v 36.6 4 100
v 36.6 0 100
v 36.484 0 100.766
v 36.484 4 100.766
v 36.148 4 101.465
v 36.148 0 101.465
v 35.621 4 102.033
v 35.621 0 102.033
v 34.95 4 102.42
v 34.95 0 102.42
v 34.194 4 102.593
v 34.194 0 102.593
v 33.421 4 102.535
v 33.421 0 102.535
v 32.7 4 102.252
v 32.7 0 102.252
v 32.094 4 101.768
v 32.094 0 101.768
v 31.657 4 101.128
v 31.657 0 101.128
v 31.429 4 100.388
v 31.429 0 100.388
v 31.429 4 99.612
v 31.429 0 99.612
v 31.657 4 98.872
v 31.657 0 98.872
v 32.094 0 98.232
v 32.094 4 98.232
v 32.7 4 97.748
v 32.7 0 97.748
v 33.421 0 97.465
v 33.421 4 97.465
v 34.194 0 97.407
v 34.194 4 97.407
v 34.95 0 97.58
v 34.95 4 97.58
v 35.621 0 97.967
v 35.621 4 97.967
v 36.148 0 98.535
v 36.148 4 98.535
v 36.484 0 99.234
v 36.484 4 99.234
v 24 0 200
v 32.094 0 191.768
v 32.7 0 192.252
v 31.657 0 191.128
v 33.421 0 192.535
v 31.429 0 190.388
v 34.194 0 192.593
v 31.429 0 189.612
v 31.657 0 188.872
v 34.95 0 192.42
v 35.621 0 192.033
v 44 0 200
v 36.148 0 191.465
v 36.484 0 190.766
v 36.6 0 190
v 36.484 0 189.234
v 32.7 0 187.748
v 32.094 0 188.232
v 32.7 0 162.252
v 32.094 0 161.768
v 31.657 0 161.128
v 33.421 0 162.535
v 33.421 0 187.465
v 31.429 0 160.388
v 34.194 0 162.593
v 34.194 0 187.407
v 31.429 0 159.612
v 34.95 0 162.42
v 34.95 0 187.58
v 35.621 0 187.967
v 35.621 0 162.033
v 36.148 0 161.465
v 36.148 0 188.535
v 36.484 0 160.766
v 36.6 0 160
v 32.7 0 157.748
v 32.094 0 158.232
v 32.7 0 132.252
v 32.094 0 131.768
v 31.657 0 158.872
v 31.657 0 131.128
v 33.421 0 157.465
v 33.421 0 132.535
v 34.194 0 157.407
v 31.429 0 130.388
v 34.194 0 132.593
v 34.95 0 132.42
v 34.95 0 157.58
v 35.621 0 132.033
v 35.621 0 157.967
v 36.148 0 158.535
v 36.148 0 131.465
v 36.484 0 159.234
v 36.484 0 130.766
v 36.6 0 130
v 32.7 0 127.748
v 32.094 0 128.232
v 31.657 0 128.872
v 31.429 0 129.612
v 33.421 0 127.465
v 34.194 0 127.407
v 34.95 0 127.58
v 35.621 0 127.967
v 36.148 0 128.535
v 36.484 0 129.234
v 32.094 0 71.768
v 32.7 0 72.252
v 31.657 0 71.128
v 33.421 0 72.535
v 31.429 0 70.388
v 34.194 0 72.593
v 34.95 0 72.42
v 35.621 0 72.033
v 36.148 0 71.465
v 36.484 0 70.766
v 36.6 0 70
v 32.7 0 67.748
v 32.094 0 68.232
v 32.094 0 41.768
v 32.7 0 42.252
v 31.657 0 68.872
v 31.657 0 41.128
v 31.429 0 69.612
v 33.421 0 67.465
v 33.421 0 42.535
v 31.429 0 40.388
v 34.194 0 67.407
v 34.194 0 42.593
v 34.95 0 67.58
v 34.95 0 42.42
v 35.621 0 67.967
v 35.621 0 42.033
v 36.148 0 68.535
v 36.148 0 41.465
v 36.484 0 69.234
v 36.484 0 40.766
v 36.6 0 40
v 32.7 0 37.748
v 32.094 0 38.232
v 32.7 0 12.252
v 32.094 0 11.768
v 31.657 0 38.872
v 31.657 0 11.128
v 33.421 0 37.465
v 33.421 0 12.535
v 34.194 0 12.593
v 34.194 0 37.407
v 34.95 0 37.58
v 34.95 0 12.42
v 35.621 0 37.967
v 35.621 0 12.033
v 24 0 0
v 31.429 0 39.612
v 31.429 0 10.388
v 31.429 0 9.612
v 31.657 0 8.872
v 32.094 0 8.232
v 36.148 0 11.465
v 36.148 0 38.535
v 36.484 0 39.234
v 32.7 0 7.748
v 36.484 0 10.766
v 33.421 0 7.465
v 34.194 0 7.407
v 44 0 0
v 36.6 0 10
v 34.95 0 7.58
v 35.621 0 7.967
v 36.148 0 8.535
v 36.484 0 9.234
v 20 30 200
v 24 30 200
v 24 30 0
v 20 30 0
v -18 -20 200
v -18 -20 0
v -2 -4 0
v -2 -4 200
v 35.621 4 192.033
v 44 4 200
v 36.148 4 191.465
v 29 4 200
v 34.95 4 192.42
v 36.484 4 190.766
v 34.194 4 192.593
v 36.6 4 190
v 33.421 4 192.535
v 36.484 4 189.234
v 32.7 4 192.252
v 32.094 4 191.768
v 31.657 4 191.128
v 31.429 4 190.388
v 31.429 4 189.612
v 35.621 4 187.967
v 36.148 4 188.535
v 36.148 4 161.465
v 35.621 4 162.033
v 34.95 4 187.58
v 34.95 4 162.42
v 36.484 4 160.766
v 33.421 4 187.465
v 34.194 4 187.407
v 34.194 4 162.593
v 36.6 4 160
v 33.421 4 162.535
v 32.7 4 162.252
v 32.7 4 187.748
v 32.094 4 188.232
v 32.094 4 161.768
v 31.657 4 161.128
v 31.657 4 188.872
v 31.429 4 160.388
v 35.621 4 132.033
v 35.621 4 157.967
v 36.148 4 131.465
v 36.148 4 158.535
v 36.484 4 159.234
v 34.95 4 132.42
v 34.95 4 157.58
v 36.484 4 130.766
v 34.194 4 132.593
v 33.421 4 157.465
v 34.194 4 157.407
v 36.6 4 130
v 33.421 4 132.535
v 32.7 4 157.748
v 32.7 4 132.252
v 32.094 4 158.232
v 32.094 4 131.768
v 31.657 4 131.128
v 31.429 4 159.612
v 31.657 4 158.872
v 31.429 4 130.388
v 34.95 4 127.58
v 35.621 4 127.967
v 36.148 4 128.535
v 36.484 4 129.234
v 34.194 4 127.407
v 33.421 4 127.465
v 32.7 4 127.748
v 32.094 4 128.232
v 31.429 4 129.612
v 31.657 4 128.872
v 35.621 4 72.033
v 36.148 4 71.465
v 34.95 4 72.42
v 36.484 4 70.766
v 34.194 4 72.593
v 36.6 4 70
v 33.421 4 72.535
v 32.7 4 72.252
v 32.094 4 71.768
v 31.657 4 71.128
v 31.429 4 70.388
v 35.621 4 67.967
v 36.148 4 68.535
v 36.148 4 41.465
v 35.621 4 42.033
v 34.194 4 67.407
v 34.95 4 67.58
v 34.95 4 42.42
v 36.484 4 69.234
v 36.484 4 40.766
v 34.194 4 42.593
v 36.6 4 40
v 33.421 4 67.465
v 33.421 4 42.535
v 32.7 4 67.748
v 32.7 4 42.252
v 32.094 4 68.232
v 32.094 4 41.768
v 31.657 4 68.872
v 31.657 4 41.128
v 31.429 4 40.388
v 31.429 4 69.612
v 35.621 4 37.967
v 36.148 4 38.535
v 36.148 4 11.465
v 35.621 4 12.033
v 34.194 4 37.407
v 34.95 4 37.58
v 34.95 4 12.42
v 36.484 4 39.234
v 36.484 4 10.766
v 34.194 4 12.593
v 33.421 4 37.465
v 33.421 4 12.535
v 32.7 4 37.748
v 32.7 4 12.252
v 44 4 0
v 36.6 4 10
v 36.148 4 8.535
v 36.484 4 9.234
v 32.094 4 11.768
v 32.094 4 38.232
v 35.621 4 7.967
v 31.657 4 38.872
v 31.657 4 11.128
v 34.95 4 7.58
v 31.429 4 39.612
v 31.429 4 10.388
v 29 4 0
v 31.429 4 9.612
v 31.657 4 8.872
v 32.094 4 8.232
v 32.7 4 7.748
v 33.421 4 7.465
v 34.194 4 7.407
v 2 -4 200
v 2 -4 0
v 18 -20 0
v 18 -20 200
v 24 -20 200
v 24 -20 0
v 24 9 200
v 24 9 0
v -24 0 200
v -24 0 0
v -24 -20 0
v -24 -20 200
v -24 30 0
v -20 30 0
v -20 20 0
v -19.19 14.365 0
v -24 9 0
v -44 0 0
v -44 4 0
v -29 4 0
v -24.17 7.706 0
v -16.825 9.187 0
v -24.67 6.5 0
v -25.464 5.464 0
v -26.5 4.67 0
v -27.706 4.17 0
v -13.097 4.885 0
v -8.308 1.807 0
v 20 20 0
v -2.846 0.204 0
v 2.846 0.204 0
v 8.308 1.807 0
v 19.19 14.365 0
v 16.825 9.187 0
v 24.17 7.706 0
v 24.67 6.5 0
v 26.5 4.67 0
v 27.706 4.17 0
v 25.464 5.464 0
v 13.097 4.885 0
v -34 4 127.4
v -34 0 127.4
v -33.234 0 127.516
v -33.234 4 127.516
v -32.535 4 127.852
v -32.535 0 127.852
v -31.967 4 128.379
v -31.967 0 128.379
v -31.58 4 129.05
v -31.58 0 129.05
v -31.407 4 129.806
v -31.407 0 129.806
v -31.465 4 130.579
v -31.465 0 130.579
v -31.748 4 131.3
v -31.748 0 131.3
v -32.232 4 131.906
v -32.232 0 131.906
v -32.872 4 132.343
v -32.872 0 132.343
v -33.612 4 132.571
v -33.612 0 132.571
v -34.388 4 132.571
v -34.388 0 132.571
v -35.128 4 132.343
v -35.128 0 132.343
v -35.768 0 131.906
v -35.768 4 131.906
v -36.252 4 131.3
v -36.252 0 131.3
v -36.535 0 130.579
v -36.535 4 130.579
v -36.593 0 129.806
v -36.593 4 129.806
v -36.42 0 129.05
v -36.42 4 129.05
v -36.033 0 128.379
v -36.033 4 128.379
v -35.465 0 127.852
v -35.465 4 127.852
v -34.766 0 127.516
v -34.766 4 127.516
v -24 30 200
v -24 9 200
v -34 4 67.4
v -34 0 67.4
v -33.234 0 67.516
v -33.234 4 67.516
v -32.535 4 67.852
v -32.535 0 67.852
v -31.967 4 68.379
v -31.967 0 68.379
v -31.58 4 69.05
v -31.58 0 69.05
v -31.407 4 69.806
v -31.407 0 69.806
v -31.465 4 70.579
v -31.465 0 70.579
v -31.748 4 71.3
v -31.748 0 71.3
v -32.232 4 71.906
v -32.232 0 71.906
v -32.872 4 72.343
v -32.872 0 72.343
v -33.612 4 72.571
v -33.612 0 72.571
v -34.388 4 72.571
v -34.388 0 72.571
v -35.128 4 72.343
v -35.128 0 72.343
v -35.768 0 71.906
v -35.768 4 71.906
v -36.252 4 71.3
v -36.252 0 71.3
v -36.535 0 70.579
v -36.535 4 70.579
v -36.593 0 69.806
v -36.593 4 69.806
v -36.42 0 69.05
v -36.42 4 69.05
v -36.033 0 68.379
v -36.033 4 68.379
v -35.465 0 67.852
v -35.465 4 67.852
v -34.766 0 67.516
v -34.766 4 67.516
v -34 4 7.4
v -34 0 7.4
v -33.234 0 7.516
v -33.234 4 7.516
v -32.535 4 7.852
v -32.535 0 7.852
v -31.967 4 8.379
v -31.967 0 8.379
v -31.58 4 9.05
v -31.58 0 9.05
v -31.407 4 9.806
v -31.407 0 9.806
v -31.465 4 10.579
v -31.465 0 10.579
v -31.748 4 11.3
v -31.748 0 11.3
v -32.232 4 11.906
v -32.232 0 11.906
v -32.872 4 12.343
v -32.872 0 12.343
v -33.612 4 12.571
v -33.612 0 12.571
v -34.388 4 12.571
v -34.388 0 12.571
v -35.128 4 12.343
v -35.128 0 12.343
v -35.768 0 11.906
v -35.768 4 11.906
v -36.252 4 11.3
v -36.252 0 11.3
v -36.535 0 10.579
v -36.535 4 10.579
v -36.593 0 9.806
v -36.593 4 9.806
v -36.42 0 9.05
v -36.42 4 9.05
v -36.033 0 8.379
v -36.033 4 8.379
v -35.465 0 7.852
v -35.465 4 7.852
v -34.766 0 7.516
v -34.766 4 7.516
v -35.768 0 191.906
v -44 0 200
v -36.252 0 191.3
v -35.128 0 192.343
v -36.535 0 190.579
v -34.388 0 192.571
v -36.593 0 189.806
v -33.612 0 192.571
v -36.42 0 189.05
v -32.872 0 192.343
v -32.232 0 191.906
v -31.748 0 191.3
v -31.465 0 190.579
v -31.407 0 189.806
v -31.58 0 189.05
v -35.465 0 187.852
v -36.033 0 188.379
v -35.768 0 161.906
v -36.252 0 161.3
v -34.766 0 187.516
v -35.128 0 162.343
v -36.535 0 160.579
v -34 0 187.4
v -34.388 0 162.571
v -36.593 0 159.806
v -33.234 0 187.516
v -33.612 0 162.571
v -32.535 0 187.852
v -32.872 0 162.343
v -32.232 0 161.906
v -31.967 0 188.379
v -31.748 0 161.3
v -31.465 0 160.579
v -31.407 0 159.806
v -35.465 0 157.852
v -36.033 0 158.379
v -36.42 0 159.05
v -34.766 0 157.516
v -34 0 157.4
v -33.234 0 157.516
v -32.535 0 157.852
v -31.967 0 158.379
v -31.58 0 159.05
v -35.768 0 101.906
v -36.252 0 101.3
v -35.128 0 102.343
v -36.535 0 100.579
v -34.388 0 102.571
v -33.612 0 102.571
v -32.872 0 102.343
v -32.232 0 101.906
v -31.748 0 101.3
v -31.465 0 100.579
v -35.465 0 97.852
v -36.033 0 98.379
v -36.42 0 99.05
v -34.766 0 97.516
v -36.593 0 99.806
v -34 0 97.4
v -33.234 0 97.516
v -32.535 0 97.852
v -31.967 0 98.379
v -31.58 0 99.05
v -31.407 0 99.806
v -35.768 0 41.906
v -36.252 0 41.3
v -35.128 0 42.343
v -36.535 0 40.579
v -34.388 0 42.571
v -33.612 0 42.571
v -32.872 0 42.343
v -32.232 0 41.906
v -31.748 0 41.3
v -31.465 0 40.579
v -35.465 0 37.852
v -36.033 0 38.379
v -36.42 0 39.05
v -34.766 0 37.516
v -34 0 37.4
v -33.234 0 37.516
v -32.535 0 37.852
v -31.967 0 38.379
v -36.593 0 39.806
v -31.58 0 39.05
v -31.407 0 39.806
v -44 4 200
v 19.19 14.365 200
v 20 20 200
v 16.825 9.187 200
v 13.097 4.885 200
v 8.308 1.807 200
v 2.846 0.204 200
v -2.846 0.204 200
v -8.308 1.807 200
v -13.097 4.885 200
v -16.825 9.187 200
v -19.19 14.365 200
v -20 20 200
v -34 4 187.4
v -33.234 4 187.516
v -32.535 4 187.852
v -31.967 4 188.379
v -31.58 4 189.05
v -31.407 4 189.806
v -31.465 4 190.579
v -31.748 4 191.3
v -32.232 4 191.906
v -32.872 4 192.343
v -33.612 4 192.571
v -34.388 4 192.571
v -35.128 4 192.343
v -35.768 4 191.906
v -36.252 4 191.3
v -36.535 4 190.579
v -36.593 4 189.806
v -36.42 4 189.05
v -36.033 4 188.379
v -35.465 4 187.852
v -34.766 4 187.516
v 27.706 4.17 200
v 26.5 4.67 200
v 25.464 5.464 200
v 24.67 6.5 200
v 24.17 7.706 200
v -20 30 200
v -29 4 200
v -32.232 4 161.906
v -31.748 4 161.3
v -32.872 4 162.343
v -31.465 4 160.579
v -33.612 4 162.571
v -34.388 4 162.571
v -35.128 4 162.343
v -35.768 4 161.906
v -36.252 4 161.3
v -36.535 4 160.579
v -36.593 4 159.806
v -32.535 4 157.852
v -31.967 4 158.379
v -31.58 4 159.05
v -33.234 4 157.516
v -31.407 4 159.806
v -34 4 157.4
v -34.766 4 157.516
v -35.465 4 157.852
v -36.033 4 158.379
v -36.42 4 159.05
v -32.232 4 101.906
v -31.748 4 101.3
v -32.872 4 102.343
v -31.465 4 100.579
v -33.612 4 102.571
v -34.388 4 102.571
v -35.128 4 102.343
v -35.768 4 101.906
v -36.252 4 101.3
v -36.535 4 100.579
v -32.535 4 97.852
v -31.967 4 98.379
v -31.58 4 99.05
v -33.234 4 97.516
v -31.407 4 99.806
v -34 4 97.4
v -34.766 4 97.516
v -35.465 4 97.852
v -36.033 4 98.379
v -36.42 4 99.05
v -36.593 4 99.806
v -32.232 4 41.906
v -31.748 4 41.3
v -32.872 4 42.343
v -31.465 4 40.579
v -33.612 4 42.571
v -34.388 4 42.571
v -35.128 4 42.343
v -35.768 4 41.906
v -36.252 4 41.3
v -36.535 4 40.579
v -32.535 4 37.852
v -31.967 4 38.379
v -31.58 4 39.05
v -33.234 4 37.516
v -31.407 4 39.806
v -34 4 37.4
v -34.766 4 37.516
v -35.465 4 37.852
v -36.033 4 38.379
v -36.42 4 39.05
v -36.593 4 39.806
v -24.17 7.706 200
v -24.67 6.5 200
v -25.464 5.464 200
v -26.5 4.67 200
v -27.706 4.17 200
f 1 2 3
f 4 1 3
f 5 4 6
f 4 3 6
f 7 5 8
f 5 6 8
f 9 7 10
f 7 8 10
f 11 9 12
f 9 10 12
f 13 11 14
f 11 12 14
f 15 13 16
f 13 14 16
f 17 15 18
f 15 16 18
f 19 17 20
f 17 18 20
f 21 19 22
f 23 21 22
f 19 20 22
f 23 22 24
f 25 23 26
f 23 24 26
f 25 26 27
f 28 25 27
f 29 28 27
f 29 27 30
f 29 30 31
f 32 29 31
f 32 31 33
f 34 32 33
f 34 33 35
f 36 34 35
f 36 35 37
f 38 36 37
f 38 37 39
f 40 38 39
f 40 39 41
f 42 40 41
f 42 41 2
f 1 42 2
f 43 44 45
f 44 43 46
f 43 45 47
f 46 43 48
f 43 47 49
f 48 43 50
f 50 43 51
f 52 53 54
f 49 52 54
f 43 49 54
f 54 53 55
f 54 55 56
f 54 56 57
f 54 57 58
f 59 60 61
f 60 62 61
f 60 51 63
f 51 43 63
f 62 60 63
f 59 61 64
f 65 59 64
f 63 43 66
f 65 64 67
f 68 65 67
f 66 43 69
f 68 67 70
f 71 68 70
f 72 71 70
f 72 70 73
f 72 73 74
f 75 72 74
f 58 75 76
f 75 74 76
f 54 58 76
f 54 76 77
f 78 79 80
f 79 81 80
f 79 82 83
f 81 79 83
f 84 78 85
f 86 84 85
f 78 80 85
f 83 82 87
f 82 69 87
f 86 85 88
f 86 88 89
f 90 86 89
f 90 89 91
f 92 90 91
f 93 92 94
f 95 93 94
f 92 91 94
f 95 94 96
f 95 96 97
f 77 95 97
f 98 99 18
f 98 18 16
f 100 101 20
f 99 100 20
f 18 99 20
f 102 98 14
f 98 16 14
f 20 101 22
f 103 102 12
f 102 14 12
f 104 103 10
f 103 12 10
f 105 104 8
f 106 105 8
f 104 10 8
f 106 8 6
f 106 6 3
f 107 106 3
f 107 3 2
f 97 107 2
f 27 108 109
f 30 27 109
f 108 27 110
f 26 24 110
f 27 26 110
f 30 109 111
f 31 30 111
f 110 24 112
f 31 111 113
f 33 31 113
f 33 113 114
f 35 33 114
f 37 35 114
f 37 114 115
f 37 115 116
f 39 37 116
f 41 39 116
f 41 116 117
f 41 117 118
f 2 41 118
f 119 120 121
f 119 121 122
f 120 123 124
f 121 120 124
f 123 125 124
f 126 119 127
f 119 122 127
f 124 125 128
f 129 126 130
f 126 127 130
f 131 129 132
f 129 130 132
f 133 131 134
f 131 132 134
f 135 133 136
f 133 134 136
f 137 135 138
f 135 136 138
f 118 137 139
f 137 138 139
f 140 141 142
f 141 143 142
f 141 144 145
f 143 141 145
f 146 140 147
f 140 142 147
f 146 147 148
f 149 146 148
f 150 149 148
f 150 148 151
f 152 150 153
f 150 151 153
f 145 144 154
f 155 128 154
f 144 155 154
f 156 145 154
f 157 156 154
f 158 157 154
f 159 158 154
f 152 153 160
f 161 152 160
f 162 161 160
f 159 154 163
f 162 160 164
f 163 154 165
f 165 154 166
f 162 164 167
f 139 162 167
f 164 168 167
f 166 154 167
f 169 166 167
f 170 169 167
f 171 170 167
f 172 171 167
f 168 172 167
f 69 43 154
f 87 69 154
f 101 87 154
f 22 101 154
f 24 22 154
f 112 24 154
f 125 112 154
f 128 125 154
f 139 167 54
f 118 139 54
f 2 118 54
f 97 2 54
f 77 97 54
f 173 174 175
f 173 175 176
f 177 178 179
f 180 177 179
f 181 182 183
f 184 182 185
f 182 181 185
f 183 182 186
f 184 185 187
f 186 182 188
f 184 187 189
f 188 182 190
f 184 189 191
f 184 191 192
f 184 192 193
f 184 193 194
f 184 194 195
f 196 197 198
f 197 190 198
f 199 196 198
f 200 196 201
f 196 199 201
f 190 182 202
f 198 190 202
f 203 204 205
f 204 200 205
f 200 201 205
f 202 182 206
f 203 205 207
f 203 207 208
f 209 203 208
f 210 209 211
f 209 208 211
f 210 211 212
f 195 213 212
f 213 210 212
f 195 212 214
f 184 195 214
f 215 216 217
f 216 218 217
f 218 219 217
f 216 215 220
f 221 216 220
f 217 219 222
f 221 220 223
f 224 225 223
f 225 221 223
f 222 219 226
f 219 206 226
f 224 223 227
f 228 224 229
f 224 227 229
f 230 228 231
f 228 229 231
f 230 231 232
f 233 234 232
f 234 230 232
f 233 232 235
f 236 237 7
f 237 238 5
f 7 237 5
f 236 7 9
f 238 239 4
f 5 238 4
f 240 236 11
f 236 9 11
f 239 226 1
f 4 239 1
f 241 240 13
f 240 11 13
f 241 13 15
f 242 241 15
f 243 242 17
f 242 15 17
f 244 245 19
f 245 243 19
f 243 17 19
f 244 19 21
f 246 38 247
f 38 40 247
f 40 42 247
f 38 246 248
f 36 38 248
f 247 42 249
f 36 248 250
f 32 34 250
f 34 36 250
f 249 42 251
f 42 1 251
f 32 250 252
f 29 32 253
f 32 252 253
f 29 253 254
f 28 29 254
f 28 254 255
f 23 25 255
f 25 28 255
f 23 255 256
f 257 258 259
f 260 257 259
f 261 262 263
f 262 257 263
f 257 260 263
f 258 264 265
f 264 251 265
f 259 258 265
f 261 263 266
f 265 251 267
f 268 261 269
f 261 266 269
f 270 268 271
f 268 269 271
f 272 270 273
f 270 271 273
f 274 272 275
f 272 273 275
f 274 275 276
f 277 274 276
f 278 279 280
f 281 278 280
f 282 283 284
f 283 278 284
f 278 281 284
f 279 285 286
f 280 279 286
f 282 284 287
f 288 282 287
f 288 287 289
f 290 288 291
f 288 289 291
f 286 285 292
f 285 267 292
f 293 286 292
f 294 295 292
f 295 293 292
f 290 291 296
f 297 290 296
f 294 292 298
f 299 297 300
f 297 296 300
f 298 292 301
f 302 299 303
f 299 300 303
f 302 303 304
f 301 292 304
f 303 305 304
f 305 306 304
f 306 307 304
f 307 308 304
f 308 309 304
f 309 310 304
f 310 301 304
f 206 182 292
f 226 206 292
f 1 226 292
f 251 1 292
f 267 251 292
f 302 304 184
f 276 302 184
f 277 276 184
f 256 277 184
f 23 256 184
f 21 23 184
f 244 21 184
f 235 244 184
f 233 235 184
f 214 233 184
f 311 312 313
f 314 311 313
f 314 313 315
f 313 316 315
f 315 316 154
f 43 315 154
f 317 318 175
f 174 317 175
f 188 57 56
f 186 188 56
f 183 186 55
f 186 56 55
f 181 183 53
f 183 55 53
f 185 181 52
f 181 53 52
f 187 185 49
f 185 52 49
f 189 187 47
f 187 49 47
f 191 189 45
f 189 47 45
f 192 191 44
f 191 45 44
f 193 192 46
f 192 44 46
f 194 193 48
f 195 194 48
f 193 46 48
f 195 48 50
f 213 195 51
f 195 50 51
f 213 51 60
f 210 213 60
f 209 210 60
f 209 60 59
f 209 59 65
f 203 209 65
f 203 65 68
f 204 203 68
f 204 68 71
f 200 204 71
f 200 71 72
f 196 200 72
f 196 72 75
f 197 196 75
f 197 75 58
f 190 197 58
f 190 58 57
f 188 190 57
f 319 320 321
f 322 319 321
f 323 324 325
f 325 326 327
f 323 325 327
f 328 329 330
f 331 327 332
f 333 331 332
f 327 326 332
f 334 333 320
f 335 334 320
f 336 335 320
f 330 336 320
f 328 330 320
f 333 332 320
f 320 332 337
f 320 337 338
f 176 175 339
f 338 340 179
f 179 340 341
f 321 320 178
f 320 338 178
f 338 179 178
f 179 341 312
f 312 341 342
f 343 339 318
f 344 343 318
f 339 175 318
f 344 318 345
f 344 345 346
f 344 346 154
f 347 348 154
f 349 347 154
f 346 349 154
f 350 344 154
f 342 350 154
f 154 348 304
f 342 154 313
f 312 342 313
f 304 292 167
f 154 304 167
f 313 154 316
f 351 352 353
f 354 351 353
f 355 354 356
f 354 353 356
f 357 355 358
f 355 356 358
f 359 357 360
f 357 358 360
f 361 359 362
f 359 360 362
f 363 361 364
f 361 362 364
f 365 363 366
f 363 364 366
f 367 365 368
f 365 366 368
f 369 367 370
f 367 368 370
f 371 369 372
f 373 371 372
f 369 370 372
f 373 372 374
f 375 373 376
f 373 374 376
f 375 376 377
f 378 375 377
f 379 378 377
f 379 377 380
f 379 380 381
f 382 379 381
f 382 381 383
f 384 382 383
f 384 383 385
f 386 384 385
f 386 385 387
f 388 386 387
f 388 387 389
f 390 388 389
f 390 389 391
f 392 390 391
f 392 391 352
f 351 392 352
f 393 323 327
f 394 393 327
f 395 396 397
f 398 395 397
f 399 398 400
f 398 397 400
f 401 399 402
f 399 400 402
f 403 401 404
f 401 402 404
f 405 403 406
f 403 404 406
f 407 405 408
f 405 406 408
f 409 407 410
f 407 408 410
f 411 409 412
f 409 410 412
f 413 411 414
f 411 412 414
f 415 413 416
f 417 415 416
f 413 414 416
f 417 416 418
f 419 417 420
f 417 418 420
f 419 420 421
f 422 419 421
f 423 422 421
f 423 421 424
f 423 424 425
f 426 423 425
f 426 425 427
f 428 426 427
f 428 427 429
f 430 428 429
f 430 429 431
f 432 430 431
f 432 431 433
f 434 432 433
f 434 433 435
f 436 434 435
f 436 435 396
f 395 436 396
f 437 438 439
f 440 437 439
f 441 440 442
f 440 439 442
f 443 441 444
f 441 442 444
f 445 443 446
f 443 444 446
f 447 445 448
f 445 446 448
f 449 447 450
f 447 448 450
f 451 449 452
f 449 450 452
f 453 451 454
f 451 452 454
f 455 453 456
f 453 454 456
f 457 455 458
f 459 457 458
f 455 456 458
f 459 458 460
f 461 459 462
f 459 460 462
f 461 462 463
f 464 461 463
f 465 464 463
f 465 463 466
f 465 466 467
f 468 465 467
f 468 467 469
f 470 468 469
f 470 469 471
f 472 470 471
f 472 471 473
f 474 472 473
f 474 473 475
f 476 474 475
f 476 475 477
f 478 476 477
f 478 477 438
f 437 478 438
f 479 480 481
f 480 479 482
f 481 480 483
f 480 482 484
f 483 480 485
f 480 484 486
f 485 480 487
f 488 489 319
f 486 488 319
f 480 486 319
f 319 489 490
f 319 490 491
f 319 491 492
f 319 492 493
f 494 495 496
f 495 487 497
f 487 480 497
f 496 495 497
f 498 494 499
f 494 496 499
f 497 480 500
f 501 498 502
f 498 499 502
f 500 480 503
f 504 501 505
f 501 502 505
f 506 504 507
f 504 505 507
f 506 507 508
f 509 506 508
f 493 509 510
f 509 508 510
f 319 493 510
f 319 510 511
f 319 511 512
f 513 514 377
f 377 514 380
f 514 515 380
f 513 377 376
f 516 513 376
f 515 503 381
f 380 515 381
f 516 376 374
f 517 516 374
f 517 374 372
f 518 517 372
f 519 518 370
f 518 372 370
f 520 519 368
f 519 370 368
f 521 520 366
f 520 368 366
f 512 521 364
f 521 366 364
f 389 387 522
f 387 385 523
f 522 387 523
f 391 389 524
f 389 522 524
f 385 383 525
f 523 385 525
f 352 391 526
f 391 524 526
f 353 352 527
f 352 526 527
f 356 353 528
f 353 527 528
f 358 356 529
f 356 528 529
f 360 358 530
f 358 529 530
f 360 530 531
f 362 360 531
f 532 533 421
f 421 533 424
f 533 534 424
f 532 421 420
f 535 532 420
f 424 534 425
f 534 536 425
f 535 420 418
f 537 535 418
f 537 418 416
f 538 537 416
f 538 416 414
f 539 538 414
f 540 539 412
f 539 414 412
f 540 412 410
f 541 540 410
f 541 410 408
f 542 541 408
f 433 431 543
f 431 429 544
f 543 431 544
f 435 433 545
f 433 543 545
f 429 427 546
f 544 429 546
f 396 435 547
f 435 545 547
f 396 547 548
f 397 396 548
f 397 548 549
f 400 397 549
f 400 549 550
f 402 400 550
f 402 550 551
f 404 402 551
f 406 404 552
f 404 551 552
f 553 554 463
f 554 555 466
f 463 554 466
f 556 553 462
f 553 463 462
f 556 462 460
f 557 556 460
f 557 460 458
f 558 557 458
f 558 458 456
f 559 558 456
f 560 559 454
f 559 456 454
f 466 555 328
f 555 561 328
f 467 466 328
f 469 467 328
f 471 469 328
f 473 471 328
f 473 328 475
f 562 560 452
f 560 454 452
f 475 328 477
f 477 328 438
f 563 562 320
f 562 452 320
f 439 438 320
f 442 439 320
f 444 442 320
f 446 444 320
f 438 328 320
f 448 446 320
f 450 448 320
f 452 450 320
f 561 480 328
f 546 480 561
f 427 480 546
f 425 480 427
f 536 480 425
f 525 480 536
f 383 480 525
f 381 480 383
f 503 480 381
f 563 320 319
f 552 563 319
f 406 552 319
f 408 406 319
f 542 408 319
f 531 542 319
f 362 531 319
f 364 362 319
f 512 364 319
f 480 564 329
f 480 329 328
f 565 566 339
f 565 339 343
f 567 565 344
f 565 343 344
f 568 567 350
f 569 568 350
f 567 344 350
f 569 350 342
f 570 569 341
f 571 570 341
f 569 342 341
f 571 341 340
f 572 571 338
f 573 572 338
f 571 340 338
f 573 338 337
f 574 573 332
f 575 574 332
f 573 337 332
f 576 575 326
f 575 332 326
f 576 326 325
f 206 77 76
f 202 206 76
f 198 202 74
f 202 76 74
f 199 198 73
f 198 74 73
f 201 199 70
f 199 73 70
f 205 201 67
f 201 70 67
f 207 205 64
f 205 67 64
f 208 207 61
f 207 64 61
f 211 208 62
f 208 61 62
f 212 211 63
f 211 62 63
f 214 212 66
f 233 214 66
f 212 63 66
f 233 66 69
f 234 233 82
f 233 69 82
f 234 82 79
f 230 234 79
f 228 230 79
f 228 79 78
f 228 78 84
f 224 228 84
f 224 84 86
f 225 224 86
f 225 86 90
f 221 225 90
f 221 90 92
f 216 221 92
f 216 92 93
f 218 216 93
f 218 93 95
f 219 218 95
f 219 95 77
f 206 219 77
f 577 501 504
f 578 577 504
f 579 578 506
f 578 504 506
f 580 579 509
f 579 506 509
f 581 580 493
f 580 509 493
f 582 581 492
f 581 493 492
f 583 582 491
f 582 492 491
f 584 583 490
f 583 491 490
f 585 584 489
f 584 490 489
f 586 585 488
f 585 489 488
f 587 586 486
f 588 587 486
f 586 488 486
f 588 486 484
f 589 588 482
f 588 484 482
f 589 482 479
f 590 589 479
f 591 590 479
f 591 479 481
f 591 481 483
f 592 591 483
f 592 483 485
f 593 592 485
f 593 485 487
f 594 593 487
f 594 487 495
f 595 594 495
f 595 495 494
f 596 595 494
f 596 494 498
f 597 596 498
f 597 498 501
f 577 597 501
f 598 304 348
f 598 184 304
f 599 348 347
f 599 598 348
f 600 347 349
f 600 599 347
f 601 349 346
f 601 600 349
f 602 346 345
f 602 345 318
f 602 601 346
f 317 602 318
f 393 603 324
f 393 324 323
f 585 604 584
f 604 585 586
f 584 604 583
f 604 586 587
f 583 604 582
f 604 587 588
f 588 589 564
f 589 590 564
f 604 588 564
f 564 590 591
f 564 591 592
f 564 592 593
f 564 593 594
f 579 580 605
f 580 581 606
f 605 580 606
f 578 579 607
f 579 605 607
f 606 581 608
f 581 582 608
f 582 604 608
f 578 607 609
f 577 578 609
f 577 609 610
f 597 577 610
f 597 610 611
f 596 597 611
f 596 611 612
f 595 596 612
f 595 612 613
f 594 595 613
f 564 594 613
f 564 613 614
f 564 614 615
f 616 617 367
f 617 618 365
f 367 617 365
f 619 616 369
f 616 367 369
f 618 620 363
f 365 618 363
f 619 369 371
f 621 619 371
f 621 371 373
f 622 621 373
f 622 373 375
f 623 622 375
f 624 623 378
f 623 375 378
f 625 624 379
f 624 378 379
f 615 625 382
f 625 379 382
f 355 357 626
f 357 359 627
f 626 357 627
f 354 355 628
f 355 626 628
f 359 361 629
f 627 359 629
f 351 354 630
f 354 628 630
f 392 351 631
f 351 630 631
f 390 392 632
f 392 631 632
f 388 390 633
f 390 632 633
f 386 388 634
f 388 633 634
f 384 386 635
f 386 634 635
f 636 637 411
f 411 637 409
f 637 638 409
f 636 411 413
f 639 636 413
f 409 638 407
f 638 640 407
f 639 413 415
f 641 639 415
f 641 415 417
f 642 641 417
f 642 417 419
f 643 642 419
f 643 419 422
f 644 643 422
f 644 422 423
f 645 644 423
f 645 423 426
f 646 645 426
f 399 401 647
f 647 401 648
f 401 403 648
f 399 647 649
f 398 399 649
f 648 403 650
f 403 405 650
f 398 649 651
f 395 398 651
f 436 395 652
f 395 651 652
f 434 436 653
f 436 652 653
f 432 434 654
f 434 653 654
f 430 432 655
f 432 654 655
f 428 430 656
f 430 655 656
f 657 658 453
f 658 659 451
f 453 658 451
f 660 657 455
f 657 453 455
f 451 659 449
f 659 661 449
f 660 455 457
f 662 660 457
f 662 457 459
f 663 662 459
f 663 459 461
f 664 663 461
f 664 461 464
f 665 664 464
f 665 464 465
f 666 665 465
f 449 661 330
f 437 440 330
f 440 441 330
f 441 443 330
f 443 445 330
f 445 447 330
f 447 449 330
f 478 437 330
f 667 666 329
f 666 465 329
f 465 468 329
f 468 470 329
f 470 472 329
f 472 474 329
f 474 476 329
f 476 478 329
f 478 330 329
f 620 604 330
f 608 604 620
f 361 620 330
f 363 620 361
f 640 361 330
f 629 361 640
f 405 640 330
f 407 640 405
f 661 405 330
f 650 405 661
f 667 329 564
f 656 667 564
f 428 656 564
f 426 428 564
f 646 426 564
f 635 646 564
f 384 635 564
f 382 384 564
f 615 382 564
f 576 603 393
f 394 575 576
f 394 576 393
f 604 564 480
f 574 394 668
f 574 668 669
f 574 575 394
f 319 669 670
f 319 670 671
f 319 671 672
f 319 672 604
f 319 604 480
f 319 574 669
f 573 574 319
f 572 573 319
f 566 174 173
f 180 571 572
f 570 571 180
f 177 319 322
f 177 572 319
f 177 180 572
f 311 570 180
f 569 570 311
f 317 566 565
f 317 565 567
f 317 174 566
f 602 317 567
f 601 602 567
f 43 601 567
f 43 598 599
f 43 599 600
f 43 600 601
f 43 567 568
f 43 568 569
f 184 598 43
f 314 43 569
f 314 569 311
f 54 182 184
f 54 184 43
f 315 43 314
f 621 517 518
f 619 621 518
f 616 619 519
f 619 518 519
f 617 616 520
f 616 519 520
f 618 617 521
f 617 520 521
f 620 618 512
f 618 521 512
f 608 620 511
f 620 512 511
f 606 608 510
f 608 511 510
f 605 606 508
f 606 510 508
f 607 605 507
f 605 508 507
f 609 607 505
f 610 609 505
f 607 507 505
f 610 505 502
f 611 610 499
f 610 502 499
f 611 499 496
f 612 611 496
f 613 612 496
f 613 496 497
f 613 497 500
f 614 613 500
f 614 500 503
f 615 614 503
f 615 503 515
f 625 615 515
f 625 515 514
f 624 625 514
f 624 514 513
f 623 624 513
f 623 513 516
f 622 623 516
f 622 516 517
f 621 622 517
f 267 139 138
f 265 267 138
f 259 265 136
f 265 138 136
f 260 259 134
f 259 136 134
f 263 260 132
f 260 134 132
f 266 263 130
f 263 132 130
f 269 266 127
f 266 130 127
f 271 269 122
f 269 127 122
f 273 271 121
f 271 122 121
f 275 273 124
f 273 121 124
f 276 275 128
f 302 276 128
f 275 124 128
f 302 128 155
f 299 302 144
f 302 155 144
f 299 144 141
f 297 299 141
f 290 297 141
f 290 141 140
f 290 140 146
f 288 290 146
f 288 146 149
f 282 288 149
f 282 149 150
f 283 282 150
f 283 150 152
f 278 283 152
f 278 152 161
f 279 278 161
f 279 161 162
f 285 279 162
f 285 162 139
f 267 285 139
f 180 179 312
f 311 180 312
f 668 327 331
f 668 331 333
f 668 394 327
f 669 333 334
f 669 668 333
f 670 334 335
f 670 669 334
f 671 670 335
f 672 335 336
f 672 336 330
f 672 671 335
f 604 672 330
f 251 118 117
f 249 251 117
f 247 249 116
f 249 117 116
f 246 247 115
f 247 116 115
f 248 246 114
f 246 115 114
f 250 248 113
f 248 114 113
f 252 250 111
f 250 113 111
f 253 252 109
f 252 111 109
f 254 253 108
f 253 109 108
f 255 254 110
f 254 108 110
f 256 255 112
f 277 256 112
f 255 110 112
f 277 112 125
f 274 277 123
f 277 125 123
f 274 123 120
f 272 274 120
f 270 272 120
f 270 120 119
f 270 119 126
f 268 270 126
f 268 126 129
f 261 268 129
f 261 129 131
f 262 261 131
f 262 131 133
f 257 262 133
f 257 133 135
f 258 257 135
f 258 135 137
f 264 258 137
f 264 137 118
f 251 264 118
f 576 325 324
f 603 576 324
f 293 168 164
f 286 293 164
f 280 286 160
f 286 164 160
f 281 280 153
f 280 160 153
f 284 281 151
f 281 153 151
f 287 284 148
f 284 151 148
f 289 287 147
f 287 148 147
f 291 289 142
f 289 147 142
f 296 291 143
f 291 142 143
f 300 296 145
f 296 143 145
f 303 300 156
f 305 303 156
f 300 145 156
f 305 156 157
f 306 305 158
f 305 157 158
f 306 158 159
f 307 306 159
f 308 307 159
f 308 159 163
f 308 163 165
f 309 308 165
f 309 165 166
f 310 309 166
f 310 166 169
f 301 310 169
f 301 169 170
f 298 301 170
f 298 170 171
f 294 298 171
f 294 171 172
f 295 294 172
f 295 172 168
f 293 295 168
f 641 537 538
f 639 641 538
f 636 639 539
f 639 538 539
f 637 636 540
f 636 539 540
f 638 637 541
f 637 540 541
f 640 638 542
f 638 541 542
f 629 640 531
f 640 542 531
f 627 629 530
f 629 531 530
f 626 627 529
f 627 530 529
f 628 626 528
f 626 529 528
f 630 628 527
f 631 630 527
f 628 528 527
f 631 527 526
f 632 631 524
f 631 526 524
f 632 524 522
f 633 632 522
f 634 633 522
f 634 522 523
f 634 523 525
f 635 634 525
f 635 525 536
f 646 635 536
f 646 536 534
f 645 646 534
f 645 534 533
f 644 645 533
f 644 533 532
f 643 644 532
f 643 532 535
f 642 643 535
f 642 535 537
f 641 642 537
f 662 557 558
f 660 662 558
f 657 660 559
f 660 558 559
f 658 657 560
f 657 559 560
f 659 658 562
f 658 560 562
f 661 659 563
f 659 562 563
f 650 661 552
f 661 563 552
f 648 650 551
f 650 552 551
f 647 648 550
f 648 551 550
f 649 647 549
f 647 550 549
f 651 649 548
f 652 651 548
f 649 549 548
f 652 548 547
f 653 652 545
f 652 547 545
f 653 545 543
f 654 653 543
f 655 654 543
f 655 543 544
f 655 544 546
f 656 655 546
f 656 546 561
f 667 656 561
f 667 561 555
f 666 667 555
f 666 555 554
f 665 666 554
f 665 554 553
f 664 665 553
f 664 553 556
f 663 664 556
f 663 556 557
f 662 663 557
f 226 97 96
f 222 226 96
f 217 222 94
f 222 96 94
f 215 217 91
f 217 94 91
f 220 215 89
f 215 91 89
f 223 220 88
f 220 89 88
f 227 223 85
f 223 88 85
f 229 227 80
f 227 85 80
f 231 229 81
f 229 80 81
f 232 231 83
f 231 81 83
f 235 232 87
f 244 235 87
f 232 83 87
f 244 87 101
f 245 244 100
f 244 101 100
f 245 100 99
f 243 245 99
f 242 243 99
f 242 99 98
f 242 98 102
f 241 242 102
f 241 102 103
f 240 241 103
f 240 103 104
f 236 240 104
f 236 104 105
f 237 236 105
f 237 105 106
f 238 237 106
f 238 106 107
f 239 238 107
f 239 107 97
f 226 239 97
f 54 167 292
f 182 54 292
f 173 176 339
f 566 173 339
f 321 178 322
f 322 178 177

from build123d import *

# Parameters (mm, degrees)
BOSS_EXTRUDE1_DEPTH = 200
FILLET1_R           = 5
CHAMFER1_SIZE       = 18
SKETCH2_R           = 2.6
CUT_EXTRUDE1_DEPTH  = 207.968596652


with BuildPart() as part:
    # Sketch1 → Boss-Extrude1 (new body)
    with BuildSketch(Plane.XY):
        with BuildLine():
            Line((-20, 20), (-20, 30))
            Line((-20, 30), (-24, 30))
            Line((-24, 30), (-24, 4))
            Line((-24, 4), (-44, 4))
            Line((-44, 4), (-44, 0))
            Line((-44, 0), (-24, 0))
            Line((-24, 0), (-24, -20))
            Line((-24, -20), (-20, -20))
            Line((-20, -20), (-20, -4))
            Line((-20, -4), (20, -4))
            Line((20, -4), (20, -20))
            Line((20, -20), (24, -20))
            Line((24, -20), (24, 0))
            Line((24, 0), (44, 0))
            Line((44, 0), (44, 4))
            Line((44, 4), (24, 4))
            Line((24, 4), (24, 30))
            Line((24, 30), (20, 30))
            Line((20, 30), (20, 20))
            ThreePointArc((20, 20), (0, 0), (-20, 20))
        make_face()
    extrude(amount=BOSS_EXTRUDE1_DEPTH)

    # Fillet1
    fillet1_edges = [part.edges().sort_by_distance(p)[0] for p in [
        (24, 4, 100),
        (-24, 4, 100),
    ]]
    fillet(fillet1_edges, radius=FILLET1_R)

    # Chamfer1
    # the kernel refuses this chamfer: 18 mm, written as the material it adds along each edge
    with BuildSketch(Plane(origin=(20, -4, 0), x_dir=(-0.9996219169112966, 0.027495876610586365, 0), z_dir=(0, 0, 1))) as chamfer1_piece_1_section:
        Polygon((CHAMFER1_SIZE * 0.999621916911, CHAMFER1_SIZE * 0.0274958766106), (-CHAMFER1_SIZE * 0.0274958766106, CHAMFER1_SIZE * 0.999621916911), (0, 0), align=None)
    chamfer1_piece_1 = extrude(amount=200, mode=Mode.PRIVATE)
    chamfer1_piece_1 = split(chamfer1_piece_1, bisect_by=Plane(origin=(13.93765318, -20, 100), z_dir=(0, 1, 0)), keep=Keep.TOP, mode=Mode.PRIVATE)
    add(chamfer1_piece_1)
    with BuildSketch(Plane(origin=(-20, -4, 0), x_dir=(-0.027495876610586584, -0.9996219169112966, 0), z_dir=(0, 0, 1))) as chamfer1_piece_2_section:
        Polygon((CHAMFER1_SIZE * 0.999621916911, CHAMFER1_SIZE * 0.0274958766106), (-CHAMFER1_SIZE * 0.0274958766106, CHAMFER1_SIZE * 0.999621916911), (0, 0), align=None)
    chamfer1_piece_2 = extrude(amount=200, mode=Mode.PRIVATE)
    chamfer1_piece_2 = split(chamfer1_piece_2, bisect_by=Plane(origin=(-13.93765318, -20, 100), z_dir=(0, 1, 0)), keep=Keep.TOP, mode=Mode.PRIVATE)
    add(chamfer1_piece_2)

    # Sketch2 → Cut-Extrude1 (cut, through all)
    with BuildSketch(Plane.XZ):
        with Locations(Location((-34, 190, 0), (0, 0, 270))):
            Circle(SKETCH2_R)
        with Locations(Location((-34, 160, 0), (0, 0, 270))):
            Circle(SKETCH2_R)
        with Locations(Location((-34, 130, 0), (0, 0, 270))):
            Circle(SKETCH2_R)
        with Locations(Location((-34, 100, 0), (0, 0, 270))):
            Circle(SKETCH2_R)
        with Locations(Location((-34, 70, 0), (0, 0, 270))):
            Circle(SKETCH2_R)
        with Locations(Location((-34, 40, 0), (0, 0, 270))):
            Circle(SKETCH2_R)
        with Locations(Location((-34, 10, 0), (0, 0, 270))):
            Circle(SKETCH2_R)
        with Locations((34, 10)):
            Circle(SKETCH2_R)
        with Locations((34, 40)):
            Circle(SKETCH2_R)
        with Locations((34, 70)):
            Circle(SKETCH2_R)
        with Locations((34, 100)):
            Circle(SKETCH2_R)
        with Locations((34, 130)):
            Circle(SKETCH2_R)
        with Locations((34, 160)):
            Circle(SKETCH2_R)
        with Locations((34, 190)):
            Circle(SKETCH2_R)
    extrude(amount=-CUT_EXTRUDE1_DEPTH, mode=Mode.SUBTRACT)


solid = part.part
